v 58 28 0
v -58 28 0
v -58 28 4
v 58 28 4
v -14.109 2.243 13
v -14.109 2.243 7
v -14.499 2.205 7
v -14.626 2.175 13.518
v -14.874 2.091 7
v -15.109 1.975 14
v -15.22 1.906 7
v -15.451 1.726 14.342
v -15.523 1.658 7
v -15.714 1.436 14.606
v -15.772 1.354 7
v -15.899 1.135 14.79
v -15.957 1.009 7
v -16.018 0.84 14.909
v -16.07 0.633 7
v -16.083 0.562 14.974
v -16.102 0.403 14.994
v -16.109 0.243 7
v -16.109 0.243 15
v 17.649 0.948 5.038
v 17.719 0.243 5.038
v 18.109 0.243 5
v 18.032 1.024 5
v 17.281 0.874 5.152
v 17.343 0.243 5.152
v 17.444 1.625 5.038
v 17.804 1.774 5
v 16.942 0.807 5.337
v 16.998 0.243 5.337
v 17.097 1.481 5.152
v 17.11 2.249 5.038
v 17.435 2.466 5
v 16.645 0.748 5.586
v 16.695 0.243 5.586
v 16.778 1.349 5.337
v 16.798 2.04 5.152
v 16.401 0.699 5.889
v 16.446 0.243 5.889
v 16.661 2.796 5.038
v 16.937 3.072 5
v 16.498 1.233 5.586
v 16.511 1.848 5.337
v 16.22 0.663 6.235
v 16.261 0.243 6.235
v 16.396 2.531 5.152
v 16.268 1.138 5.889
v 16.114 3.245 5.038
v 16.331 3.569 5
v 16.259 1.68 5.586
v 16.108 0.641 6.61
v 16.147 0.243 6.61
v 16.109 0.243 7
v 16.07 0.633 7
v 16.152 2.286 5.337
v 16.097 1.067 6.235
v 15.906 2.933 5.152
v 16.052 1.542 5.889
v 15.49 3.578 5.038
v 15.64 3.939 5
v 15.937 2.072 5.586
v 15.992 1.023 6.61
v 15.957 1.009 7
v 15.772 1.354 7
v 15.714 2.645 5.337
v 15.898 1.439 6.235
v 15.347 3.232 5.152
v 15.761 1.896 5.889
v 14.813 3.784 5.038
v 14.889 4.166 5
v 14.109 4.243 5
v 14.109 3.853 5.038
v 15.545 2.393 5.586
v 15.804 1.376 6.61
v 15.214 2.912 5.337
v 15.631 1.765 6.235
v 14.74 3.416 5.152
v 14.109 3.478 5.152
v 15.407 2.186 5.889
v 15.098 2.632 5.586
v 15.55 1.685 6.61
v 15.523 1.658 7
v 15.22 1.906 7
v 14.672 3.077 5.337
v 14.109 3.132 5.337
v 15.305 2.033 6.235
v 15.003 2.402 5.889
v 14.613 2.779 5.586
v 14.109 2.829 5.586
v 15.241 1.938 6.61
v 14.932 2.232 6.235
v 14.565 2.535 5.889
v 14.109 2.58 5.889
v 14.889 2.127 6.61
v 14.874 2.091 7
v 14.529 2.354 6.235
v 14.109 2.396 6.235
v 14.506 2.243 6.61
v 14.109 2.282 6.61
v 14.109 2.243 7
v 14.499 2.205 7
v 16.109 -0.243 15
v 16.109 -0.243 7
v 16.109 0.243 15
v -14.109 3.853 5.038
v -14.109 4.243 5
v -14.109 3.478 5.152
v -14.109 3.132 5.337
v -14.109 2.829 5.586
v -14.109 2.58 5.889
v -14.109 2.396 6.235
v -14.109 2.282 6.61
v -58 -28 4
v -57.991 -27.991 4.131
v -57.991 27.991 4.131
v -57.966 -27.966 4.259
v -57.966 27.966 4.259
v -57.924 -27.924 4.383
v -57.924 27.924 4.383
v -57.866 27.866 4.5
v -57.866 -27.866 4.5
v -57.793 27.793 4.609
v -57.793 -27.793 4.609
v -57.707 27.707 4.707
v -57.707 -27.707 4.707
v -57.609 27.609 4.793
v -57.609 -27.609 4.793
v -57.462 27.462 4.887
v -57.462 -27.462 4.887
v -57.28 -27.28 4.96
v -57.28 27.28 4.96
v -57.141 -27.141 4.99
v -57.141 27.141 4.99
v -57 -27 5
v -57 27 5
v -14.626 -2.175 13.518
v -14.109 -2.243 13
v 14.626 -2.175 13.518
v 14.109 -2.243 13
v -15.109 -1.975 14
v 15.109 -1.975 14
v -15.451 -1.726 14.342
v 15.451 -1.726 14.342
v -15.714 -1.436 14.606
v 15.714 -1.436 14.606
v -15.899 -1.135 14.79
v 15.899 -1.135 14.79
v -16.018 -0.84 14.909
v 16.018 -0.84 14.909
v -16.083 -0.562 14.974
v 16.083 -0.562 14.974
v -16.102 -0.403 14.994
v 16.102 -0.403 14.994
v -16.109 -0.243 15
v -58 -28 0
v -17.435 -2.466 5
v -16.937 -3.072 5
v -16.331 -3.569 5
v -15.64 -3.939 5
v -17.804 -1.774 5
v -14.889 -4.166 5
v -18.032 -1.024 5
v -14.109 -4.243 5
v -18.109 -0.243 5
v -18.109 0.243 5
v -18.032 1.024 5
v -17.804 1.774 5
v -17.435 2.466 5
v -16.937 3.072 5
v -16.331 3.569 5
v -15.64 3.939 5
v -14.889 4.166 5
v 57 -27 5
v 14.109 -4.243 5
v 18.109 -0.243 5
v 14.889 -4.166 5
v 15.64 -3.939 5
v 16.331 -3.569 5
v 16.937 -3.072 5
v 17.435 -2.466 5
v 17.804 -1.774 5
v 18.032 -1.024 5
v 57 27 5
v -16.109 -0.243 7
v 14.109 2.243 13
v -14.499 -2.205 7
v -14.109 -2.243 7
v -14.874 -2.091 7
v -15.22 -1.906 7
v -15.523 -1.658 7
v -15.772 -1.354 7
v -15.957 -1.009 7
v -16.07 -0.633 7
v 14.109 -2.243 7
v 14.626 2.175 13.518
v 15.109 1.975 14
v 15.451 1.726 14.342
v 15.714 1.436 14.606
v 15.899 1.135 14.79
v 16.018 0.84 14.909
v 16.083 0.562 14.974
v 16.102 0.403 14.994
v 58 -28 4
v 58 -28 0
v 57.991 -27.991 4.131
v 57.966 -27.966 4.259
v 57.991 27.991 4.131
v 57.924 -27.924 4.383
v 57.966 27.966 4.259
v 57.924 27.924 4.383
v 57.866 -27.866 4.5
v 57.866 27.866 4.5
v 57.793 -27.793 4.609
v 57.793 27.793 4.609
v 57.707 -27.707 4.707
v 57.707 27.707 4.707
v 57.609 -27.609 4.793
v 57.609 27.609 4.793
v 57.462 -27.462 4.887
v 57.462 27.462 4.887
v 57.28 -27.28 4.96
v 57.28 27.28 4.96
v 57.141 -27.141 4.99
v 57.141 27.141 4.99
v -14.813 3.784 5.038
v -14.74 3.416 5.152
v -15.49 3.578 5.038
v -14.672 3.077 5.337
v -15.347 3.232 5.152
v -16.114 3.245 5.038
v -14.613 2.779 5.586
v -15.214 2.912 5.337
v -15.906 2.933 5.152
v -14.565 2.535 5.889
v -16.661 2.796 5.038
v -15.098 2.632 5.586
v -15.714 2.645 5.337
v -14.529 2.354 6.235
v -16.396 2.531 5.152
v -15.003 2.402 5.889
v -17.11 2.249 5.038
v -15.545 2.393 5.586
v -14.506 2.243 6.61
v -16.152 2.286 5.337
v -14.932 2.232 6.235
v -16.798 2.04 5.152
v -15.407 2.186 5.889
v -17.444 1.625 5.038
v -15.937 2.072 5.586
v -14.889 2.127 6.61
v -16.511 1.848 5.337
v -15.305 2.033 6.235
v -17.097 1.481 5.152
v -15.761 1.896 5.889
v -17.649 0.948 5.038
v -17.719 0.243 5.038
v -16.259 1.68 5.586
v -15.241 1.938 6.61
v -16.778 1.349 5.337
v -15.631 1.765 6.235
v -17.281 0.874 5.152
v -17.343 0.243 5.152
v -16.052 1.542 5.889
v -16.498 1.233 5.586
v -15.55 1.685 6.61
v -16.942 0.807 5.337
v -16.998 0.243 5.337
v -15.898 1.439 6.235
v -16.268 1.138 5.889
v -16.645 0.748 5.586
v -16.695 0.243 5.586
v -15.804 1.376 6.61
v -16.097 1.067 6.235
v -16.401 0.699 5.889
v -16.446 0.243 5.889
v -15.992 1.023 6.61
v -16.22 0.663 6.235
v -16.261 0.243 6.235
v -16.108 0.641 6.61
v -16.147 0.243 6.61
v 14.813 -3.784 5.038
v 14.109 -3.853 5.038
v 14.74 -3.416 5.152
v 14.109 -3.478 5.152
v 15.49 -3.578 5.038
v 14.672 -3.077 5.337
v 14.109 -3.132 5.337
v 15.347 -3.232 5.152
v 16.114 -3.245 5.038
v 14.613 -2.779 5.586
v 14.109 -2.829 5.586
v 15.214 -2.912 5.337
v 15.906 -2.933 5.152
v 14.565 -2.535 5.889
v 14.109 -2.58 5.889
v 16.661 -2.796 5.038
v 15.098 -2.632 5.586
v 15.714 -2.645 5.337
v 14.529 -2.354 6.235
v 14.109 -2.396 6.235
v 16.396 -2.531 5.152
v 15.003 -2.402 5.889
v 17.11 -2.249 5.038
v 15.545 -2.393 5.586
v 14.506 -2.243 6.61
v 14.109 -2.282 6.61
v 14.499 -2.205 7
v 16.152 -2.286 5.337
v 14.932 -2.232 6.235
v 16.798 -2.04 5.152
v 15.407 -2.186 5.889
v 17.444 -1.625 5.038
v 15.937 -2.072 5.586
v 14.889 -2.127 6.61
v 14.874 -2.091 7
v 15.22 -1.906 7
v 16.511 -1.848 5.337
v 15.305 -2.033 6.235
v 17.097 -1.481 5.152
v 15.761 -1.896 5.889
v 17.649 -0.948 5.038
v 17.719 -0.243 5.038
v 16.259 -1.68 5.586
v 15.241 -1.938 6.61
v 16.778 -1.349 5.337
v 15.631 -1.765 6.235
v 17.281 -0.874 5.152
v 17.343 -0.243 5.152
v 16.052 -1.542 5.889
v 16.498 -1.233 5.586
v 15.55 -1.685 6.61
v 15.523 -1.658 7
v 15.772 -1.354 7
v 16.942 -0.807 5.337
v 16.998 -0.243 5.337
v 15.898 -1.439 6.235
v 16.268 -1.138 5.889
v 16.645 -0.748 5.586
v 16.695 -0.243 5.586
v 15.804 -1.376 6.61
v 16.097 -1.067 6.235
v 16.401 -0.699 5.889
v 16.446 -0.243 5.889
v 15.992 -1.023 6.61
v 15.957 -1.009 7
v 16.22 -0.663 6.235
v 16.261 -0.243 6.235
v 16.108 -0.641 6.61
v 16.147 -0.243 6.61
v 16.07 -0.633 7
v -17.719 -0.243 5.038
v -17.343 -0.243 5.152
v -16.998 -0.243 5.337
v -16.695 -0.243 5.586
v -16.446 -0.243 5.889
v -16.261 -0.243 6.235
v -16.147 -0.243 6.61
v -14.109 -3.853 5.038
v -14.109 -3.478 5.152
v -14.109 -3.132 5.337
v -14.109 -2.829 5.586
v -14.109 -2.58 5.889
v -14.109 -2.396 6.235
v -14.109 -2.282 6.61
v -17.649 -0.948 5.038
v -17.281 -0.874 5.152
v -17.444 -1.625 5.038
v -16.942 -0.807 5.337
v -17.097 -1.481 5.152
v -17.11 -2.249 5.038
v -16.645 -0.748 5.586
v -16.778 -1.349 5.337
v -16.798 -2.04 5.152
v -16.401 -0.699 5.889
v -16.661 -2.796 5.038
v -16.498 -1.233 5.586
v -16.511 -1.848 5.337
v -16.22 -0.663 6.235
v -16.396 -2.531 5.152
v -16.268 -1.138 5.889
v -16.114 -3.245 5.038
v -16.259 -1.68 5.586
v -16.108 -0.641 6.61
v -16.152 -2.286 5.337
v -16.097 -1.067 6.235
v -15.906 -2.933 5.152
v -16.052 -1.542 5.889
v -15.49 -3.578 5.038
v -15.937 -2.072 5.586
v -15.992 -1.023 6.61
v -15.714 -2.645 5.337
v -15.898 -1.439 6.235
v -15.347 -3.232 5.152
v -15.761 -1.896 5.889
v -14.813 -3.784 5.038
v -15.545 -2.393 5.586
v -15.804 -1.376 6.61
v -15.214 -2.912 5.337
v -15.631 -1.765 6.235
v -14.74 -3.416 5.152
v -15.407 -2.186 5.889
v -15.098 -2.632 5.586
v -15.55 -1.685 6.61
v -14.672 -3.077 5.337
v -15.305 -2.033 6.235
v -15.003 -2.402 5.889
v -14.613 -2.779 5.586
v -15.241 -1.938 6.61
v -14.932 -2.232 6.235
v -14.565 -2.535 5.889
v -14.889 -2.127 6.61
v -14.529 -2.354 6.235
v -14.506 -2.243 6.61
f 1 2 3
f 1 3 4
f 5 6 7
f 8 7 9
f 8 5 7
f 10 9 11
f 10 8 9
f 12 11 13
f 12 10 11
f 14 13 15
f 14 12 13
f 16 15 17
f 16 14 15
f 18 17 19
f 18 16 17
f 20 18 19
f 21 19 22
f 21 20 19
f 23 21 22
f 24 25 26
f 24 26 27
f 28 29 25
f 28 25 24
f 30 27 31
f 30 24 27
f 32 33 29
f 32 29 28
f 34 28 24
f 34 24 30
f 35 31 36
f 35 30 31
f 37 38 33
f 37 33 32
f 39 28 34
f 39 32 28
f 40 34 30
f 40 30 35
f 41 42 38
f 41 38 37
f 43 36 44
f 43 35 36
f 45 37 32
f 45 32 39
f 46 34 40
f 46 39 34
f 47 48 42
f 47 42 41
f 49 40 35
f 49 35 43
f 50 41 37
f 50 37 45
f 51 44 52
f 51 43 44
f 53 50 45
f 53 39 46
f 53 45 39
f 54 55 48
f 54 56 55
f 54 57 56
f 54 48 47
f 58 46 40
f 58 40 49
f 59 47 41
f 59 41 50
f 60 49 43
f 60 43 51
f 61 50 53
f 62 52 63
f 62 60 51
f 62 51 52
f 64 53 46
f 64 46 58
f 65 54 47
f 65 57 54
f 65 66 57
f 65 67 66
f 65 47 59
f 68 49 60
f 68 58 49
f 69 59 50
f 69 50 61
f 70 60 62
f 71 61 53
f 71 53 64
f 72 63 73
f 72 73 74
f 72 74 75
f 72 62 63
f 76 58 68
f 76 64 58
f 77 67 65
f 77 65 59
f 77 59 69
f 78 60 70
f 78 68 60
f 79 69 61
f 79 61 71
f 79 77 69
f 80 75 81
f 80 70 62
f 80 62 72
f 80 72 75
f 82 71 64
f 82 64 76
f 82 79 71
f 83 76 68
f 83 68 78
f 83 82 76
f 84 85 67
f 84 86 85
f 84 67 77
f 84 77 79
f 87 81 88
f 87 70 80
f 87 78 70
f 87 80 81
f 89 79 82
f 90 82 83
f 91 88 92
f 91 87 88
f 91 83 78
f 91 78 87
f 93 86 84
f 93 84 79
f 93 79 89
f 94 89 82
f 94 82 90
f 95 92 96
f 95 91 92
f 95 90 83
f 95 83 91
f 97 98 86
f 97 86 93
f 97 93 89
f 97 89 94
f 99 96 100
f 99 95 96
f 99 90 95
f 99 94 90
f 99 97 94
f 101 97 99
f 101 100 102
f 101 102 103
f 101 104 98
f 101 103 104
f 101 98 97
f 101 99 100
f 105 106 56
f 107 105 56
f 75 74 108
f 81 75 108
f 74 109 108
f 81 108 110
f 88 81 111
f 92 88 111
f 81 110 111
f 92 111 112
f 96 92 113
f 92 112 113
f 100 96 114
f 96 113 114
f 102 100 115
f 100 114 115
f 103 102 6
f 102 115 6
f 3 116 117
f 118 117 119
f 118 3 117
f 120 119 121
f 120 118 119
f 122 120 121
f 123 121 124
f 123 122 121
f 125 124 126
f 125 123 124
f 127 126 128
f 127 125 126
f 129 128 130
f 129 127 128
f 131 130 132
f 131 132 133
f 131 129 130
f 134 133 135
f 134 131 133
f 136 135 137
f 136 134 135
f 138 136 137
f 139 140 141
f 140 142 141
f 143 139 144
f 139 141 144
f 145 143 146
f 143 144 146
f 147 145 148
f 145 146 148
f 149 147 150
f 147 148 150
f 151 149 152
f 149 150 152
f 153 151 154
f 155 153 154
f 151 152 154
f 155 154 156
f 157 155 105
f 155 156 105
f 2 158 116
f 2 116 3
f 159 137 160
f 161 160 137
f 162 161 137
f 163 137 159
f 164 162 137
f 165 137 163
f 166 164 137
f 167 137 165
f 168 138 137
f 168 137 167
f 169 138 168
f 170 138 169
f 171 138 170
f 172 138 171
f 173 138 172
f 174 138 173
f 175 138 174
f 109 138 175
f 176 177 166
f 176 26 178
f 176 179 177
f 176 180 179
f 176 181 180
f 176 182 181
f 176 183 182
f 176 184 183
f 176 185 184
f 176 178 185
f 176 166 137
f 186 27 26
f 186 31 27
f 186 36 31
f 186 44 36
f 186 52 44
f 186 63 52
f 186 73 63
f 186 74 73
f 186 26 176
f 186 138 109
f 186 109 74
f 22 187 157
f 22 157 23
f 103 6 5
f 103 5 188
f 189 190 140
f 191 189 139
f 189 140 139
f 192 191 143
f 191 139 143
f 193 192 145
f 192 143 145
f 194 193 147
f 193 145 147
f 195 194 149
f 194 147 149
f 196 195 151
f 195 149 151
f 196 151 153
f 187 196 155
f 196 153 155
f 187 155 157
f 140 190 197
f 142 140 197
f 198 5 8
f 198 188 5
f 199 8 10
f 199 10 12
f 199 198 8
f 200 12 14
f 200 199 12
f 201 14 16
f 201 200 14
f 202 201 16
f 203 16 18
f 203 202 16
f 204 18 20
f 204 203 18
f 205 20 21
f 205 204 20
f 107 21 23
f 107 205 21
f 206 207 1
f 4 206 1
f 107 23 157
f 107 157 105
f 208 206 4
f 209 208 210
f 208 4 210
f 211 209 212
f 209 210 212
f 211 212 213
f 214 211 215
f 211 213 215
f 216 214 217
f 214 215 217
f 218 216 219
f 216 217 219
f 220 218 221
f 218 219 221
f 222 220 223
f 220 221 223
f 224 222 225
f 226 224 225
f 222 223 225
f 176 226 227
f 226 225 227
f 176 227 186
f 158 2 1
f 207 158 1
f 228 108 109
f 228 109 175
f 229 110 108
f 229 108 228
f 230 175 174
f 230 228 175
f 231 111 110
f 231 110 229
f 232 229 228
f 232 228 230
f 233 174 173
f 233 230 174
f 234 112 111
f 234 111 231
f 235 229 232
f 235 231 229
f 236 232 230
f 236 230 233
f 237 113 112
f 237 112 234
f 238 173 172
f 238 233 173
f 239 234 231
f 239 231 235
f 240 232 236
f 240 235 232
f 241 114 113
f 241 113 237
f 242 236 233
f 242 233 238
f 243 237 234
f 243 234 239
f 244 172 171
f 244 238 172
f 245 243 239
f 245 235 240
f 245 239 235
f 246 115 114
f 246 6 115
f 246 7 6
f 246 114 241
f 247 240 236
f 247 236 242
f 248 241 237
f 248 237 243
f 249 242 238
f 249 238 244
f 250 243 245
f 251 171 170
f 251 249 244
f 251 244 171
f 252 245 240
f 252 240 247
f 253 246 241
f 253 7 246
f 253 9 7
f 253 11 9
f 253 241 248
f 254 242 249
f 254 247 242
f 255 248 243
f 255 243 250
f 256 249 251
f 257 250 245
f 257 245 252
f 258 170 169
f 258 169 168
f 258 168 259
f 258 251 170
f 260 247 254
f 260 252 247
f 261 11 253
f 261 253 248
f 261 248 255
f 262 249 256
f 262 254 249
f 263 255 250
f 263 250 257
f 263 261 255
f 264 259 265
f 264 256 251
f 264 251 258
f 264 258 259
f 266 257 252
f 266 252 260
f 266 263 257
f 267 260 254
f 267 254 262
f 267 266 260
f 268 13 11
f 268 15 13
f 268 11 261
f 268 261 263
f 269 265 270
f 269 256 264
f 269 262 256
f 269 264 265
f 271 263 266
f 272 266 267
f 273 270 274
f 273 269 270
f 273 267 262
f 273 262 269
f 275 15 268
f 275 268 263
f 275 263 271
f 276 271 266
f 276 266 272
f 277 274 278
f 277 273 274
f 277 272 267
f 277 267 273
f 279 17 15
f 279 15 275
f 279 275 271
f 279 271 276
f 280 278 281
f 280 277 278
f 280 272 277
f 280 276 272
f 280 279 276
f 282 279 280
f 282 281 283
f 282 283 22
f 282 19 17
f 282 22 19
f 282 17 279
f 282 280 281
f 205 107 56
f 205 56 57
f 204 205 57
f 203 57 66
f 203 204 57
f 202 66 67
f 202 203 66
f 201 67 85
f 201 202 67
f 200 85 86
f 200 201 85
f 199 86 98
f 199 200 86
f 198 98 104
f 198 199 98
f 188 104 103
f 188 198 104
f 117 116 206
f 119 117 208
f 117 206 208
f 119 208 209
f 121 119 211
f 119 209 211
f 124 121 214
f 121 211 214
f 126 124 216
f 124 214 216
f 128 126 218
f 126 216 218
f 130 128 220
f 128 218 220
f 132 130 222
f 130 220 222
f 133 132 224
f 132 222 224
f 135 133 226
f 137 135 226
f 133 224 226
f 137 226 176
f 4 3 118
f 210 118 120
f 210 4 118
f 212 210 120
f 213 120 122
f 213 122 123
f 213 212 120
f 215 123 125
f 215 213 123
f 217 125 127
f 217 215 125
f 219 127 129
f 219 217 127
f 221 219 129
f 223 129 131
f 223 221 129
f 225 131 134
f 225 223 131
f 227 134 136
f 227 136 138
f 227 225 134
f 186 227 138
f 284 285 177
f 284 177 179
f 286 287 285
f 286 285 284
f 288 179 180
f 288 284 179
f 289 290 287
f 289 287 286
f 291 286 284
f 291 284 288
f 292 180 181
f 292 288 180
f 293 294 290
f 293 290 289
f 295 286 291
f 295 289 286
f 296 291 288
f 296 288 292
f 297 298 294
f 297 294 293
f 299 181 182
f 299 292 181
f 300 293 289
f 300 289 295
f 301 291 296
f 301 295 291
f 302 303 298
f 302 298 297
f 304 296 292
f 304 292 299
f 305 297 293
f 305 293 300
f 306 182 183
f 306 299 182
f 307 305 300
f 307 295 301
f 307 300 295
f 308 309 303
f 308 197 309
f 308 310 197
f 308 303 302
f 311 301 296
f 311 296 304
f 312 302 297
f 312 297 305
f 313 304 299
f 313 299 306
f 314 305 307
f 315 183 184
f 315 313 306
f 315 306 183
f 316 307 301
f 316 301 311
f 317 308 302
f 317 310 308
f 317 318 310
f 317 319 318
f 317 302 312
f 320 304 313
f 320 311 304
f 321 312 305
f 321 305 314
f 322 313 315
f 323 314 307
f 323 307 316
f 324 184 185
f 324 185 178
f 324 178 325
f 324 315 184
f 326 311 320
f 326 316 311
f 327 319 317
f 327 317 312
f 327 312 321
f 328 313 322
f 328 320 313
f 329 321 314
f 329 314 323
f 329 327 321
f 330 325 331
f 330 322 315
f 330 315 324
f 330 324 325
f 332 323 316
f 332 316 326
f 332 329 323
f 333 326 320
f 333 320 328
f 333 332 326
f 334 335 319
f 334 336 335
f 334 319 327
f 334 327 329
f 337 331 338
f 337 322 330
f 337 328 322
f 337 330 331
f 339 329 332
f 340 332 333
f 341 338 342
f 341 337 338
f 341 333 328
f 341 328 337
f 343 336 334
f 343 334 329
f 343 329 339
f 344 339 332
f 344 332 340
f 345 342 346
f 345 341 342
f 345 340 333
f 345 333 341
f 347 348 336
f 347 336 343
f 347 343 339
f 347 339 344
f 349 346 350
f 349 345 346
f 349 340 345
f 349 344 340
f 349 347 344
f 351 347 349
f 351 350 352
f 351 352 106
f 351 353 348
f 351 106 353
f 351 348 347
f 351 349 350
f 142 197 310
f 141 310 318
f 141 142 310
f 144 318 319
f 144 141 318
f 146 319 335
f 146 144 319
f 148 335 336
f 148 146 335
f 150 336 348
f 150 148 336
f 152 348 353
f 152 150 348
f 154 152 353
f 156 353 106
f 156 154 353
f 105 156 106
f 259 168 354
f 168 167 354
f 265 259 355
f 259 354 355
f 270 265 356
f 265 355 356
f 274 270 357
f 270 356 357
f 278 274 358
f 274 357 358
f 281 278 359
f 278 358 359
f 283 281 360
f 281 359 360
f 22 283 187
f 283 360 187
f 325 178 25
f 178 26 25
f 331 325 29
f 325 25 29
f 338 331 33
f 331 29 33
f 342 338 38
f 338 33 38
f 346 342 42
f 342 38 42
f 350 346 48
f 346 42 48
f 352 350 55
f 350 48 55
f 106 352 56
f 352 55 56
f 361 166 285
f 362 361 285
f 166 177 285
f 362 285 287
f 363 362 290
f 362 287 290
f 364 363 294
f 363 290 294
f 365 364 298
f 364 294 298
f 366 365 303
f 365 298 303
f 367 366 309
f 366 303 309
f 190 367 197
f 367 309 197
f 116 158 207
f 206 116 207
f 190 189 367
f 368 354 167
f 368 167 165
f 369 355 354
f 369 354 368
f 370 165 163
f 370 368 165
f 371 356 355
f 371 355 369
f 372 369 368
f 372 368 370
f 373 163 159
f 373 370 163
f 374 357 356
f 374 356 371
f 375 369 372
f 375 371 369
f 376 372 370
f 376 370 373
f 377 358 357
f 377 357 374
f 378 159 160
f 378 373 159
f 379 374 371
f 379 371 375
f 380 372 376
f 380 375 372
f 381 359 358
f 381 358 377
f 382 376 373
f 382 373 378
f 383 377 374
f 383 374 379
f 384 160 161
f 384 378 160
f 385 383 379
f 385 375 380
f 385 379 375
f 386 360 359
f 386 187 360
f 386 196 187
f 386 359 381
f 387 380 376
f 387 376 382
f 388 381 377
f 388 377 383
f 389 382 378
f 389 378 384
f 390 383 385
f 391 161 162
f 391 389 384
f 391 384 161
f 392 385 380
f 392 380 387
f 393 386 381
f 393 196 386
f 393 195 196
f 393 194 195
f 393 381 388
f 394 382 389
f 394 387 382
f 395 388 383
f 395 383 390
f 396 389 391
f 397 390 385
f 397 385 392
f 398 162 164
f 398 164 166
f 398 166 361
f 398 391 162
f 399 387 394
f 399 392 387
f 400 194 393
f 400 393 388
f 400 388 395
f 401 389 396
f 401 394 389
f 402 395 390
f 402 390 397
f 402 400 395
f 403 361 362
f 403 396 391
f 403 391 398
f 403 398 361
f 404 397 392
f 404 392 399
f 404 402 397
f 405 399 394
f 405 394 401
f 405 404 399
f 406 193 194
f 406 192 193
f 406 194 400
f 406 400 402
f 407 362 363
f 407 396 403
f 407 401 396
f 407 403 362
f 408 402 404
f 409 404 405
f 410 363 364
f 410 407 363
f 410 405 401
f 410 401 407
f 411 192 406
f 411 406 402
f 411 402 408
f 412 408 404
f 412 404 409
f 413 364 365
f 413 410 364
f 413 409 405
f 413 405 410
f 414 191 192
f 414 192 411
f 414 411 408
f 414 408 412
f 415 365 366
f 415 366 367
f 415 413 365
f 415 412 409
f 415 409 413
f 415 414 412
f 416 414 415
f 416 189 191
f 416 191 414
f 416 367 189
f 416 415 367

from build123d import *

# Parameters (mm, degrees)
F0_W     = 116
F0_H     = 56
F1_DEPTH = 5
F2_R     = 1
F3_W     = 32.2175696492
F3_H     = 4.4865976088
F4_DEPTH = 10
F5_F1_R  = 2
F5_F2_R  = 2


with BuildPart() as f1:
    # F0 (on Top) → F1 (new body)
    with BuildSketch(Plane.XY):
        Rectangle(F0_W, F0_H)
    extrude(amount=F1_DEPTH)

    # F2
    f2_edges = [f1.edges().sort_by_distance(p)[0] for p in [
        (0, -28, 5),
        (-58, 0, 5),
        (0, 28, 5),
        (58, 0, 5),
    ]]
    fillet(f2_edges, radius=F2_R)

    # F3 (on face) → F4 (join)
    with BuildSketch(Plane.XY.offset(5)):
        Rectangle(F3_W, F3_H)
    extrude(amount=F4_DEPTH)

    # F5: fillet of radius 2 on 8 edges, made by hand

    # F5_f1
    f5_f1_edges = [f1.edges().sort_by_distance(p)[0] for p in [
        (-16.1087848246, -2.2432988044, 10),
        (-16.1087848246, 2.2432988044, 10),
        (0, -2.2432988044, 15),
        (0, 2.2432988044, 15),
        (16.1087848246, -2.2432988044, 10),
        (16.1087848246, 2.2432988044, 10),
    ]]
    fillet(f5_f1_edges, radius=F5_F1_R)

    # F5_f2
    f5_f2_edges = [f1.edges().sort_by_distance(p)[0] for p in [
        (0, -2.2432988044, 5),
        (0, 2.2432988044, 5),
        (15.522998387, 1.6575123668, 5),
        (-15.522998387, 1.6575123668, 5),
        (-15.522998387, -1.6575123668, 5),
        (15.522998387, -1.6575123668, 5),
    ]]
    fillet(f5_f2_edges, radius=F5_F2_R)


solid = f1.part
